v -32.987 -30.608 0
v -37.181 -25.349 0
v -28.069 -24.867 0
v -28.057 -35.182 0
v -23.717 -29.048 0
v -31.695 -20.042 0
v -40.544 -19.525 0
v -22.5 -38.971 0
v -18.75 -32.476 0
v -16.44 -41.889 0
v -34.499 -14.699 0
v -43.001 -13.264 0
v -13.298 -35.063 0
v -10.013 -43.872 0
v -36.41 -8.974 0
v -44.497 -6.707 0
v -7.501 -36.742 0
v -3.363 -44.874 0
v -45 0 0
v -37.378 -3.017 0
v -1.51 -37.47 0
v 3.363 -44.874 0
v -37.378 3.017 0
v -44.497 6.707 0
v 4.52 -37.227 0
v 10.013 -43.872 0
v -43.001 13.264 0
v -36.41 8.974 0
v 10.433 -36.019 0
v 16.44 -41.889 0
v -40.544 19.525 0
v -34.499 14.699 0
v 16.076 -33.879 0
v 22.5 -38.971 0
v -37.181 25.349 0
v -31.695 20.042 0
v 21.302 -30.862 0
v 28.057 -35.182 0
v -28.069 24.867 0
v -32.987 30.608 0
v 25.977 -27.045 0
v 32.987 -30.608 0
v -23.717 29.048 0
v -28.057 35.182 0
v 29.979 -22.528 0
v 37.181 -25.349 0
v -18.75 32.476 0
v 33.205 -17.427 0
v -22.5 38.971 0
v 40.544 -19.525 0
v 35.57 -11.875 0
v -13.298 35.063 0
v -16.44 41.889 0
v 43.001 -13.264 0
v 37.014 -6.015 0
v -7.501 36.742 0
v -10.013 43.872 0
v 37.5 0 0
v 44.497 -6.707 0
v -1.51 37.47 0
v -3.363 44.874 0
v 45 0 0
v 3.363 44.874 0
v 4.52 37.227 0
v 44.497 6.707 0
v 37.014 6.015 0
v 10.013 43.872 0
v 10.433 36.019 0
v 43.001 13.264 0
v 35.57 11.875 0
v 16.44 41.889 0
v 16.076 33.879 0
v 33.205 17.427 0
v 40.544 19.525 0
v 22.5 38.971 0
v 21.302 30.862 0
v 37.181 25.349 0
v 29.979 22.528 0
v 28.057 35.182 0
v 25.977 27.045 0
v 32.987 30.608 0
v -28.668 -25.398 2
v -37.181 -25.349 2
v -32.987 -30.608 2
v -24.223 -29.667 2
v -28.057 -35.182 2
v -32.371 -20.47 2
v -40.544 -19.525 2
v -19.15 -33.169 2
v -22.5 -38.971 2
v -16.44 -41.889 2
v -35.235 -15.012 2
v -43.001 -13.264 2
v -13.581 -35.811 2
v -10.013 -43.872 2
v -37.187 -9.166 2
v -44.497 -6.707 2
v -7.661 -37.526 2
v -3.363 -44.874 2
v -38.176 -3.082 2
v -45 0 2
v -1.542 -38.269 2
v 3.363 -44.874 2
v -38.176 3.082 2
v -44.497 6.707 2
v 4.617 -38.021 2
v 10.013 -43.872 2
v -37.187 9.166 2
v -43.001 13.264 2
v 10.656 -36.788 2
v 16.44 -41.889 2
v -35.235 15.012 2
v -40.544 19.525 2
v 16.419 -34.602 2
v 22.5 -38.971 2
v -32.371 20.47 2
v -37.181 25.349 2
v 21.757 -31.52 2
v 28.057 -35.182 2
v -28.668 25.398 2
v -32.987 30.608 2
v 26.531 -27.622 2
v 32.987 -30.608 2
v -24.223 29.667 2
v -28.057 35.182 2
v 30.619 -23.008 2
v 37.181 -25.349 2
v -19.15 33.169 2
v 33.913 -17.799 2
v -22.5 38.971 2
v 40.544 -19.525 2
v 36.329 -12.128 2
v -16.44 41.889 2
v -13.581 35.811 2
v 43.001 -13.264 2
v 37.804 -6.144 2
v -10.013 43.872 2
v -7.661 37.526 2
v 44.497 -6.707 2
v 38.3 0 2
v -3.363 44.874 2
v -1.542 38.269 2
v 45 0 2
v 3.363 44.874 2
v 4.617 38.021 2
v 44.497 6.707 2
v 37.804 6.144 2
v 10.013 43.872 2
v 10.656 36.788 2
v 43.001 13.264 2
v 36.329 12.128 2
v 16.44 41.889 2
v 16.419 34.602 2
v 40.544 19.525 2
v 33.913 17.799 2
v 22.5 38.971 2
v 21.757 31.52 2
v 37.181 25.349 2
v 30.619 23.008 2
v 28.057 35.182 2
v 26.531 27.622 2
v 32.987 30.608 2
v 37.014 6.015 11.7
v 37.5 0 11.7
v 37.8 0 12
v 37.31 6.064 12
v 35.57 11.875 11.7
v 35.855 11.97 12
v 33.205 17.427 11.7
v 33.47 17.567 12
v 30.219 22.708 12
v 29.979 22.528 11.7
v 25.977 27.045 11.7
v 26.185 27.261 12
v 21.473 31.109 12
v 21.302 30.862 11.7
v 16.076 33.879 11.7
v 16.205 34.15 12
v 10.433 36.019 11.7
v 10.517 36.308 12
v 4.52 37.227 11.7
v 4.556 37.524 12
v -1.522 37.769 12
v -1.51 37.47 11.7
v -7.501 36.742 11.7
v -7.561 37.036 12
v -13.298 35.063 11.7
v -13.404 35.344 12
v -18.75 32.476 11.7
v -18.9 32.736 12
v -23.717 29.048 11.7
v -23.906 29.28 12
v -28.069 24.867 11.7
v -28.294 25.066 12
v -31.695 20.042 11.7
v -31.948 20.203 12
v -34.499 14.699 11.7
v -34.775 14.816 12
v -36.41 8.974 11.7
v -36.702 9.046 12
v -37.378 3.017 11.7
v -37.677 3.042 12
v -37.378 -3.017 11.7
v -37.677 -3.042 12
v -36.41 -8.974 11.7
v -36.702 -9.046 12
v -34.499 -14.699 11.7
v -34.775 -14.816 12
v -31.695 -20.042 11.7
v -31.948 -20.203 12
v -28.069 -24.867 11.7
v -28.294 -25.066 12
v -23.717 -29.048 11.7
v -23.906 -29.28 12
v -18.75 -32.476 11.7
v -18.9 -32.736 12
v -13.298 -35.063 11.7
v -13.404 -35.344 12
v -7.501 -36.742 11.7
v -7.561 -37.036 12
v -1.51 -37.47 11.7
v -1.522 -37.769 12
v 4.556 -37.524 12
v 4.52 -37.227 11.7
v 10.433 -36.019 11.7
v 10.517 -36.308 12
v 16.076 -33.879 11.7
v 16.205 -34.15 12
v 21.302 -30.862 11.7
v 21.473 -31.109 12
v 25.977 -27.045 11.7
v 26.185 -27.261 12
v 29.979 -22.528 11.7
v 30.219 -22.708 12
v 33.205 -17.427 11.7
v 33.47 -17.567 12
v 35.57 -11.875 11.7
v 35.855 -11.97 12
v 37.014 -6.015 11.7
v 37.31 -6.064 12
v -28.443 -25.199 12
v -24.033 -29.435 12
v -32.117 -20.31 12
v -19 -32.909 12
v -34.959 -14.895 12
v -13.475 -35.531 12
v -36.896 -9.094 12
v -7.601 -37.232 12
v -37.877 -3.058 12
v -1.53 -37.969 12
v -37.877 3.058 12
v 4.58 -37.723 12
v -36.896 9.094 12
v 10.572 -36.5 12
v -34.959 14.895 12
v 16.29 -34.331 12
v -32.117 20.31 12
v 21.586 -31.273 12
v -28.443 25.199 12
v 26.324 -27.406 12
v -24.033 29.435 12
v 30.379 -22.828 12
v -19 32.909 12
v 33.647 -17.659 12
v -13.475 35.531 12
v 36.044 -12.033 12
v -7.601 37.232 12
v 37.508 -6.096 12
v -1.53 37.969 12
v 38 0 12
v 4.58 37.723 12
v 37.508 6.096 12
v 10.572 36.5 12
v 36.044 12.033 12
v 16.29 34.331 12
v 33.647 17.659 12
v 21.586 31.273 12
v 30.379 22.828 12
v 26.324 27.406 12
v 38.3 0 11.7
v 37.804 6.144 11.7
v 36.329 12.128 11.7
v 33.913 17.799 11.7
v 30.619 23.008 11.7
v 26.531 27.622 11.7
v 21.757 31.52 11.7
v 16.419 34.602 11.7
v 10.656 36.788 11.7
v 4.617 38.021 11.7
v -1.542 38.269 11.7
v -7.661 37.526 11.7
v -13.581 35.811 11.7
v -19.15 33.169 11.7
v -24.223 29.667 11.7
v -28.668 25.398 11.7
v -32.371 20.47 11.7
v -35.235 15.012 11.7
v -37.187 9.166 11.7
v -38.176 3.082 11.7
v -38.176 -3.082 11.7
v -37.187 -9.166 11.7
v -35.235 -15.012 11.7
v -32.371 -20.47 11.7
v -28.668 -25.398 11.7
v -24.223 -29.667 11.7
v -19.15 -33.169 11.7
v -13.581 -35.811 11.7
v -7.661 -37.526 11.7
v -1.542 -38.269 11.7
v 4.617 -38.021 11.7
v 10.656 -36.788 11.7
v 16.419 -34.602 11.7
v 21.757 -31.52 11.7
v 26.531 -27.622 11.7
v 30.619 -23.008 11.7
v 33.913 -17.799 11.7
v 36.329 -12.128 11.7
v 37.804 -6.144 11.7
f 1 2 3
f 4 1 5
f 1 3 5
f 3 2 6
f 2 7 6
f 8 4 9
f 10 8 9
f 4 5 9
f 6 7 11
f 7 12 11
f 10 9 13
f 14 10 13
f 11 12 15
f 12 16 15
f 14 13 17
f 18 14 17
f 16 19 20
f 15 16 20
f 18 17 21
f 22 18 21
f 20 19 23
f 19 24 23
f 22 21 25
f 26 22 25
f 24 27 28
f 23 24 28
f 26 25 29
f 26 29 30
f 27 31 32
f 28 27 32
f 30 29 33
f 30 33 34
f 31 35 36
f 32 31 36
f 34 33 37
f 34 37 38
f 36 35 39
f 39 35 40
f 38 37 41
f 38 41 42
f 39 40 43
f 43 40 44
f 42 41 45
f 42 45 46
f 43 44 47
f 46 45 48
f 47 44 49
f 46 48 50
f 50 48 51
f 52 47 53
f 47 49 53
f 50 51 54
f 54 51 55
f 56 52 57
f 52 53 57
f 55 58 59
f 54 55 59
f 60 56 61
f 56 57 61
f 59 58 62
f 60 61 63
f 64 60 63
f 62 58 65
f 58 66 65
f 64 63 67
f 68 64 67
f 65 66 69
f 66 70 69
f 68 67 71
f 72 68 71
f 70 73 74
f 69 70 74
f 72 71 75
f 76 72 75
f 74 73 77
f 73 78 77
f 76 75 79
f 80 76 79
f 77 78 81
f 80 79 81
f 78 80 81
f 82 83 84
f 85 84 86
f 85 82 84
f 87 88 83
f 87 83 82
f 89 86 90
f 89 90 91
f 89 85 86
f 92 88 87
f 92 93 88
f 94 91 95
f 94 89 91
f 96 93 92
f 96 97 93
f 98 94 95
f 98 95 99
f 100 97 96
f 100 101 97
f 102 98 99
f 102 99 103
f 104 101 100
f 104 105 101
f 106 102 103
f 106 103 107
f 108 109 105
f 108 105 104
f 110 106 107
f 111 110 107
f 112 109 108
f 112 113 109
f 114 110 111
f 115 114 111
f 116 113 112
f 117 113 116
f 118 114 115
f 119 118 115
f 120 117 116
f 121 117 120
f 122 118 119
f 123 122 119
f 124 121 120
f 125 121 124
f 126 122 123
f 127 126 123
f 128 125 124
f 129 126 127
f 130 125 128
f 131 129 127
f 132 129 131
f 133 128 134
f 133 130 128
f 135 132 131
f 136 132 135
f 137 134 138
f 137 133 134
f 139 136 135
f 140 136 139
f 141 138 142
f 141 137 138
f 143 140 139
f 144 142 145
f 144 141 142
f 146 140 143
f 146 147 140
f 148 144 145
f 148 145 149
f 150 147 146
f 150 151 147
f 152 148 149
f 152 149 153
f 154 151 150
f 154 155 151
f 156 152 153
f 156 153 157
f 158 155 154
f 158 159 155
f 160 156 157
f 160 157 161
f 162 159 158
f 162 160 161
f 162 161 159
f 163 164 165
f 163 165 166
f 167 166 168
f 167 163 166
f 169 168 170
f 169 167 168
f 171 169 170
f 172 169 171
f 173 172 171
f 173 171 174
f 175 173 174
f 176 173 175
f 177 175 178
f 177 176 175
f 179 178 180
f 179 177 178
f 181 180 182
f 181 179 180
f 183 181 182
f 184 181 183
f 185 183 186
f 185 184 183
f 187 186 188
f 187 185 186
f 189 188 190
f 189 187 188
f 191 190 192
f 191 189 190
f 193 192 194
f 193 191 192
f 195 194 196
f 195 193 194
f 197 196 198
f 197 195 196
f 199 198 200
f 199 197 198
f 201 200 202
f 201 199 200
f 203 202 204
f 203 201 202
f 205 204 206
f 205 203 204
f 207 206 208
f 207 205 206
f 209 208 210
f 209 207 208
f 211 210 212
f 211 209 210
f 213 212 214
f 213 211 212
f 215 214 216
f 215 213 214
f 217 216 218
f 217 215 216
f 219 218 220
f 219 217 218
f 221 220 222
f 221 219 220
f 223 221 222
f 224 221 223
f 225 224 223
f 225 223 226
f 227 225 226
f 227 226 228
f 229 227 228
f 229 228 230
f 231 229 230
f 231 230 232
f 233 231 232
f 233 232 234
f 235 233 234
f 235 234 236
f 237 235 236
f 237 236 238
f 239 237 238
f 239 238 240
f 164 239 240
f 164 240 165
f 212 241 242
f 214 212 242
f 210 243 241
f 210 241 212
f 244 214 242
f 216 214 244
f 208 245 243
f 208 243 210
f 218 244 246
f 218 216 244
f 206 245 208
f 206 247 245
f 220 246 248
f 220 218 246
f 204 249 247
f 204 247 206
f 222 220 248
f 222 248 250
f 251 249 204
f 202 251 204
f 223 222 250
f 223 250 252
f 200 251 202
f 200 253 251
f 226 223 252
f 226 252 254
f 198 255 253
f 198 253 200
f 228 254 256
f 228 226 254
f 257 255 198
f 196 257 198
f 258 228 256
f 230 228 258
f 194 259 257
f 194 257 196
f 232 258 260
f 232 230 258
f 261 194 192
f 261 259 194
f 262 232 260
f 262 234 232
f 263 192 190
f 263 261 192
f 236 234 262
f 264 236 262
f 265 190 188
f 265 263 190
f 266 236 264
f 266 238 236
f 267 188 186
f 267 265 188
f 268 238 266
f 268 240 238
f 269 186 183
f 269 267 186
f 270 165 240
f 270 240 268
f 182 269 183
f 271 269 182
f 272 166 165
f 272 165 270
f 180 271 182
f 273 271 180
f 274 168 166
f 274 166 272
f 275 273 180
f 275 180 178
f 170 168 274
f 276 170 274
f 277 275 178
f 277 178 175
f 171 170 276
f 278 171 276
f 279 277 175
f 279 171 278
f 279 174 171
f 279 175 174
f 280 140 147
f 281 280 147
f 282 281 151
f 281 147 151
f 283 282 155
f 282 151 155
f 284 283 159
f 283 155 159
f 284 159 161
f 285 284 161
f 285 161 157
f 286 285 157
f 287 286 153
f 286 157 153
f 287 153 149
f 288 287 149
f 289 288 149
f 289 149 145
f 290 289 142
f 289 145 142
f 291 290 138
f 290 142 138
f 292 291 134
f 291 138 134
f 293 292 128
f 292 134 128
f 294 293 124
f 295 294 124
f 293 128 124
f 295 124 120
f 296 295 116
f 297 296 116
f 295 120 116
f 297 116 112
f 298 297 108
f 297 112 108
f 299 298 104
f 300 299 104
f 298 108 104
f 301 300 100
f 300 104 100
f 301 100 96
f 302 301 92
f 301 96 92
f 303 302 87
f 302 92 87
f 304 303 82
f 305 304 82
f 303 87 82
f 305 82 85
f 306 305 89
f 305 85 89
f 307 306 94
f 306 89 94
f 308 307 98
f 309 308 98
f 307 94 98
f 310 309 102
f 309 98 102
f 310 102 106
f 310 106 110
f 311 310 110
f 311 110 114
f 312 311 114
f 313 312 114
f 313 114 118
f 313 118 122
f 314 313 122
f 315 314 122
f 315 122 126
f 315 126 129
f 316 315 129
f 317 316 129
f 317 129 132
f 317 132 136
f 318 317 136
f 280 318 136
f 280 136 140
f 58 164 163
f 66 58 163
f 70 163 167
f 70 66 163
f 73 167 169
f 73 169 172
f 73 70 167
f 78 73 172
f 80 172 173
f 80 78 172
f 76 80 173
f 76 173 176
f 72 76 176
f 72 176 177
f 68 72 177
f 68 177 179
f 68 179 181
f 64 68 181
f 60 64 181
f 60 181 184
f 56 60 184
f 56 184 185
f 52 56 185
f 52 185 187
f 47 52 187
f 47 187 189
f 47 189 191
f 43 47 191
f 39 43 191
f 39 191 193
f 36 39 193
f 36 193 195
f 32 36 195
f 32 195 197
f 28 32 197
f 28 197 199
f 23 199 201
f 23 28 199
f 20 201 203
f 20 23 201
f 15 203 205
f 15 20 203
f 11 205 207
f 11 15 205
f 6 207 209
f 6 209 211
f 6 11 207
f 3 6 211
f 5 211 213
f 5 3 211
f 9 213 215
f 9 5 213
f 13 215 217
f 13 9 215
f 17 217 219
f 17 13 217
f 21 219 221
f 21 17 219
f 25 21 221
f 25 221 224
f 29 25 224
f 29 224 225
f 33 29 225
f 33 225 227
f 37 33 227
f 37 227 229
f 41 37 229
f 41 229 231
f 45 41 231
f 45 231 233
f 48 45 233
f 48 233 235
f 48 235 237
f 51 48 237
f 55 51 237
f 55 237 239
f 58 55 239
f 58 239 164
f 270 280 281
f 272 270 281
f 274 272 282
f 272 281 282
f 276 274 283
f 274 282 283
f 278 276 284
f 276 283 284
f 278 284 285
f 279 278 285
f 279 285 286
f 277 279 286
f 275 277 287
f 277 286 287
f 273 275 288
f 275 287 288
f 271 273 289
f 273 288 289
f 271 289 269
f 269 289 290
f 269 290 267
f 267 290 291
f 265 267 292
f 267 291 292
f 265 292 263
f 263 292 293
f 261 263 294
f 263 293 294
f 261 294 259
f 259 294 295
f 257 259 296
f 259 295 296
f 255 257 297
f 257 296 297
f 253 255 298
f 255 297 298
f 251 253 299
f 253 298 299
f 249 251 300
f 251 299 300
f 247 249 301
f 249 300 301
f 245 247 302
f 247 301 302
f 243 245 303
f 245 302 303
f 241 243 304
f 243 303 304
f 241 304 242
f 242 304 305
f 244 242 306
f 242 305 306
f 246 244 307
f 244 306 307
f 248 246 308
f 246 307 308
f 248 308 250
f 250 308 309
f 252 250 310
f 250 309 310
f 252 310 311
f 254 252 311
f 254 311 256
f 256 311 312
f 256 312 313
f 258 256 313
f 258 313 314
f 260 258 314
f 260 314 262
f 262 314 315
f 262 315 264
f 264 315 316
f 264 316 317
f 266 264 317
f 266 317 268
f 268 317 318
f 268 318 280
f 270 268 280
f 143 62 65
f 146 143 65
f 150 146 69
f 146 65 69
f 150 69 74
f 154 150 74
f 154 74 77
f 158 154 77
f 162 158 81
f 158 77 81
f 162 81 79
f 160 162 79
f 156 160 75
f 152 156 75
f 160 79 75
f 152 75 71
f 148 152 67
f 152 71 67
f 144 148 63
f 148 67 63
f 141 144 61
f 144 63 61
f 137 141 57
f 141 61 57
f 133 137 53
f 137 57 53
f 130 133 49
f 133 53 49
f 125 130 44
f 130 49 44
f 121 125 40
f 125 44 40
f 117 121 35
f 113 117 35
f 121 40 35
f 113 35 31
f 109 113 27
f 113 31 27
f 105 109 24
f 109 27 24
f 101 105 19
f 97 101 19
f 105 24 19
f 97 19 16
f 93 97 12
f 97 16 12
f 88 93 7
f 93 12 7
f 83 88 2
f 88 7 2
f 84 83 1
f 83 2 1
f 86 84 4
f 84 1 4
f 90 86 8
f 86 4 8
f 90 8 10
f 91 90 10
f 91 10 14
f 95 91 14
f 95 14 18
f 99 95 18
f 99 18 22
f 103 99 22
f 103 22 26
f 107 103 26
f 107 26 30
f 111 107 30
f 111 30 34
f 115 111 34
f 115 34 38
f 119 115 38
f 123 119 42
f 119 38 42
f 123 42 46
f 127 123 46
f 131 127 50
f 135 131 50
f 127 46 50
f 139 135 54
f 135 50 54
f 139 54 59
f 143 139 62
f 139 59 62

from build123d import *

# Parameters (mm, degrees)
SKETCH_R        = 45
SKETCH_R_2      = 37.5
PAD_DEPTH       = 2
SKETCH001_R     = 38.3
SKETCH001_R_2   = 37.5
PAD001_DEPTH    = 10
CHAMFER_SIZE    = 0.3
CHAMFER001_SIZE = 0.3


with BuildPart() as part:
    # Sketch → Pad (new body)
    with BuildSketch(Plane.XY):
        Circle(SKETCH_R)
        Circle(SKETCH_R_2, mode=Mode.SUBTRACT)
    extrude(amount=PAD_DEPTH)

    # Sketch001 (on Face4 of Pad) → Pad001 (join)
    with BuildSketch(Plane.XY.offset(2)):
        Circle(SKETCH001_R)
        Circle(SKETCH001_R_2, mode=Mode.SUBTRACT)
    extrude(amount=PAD001_DEPTH)

    # Chamfer
    chamfer_edges = [part.edges().sort_by_distance(p)[0] for p in [
        (-37.5, 0, 12),
    ]]
    chamfer(chamfer_edges, length=CHAMFER_SIZE)

    # Chamfer001
    chamfer001_edges = [part.edges().sort_by_distance(p)[0] for p in [
        (-38.3, 0, 12),
    ]]
    chamfer(chamfer001_edges, length=CHAMFER001_SIZE)


solid = part.part
